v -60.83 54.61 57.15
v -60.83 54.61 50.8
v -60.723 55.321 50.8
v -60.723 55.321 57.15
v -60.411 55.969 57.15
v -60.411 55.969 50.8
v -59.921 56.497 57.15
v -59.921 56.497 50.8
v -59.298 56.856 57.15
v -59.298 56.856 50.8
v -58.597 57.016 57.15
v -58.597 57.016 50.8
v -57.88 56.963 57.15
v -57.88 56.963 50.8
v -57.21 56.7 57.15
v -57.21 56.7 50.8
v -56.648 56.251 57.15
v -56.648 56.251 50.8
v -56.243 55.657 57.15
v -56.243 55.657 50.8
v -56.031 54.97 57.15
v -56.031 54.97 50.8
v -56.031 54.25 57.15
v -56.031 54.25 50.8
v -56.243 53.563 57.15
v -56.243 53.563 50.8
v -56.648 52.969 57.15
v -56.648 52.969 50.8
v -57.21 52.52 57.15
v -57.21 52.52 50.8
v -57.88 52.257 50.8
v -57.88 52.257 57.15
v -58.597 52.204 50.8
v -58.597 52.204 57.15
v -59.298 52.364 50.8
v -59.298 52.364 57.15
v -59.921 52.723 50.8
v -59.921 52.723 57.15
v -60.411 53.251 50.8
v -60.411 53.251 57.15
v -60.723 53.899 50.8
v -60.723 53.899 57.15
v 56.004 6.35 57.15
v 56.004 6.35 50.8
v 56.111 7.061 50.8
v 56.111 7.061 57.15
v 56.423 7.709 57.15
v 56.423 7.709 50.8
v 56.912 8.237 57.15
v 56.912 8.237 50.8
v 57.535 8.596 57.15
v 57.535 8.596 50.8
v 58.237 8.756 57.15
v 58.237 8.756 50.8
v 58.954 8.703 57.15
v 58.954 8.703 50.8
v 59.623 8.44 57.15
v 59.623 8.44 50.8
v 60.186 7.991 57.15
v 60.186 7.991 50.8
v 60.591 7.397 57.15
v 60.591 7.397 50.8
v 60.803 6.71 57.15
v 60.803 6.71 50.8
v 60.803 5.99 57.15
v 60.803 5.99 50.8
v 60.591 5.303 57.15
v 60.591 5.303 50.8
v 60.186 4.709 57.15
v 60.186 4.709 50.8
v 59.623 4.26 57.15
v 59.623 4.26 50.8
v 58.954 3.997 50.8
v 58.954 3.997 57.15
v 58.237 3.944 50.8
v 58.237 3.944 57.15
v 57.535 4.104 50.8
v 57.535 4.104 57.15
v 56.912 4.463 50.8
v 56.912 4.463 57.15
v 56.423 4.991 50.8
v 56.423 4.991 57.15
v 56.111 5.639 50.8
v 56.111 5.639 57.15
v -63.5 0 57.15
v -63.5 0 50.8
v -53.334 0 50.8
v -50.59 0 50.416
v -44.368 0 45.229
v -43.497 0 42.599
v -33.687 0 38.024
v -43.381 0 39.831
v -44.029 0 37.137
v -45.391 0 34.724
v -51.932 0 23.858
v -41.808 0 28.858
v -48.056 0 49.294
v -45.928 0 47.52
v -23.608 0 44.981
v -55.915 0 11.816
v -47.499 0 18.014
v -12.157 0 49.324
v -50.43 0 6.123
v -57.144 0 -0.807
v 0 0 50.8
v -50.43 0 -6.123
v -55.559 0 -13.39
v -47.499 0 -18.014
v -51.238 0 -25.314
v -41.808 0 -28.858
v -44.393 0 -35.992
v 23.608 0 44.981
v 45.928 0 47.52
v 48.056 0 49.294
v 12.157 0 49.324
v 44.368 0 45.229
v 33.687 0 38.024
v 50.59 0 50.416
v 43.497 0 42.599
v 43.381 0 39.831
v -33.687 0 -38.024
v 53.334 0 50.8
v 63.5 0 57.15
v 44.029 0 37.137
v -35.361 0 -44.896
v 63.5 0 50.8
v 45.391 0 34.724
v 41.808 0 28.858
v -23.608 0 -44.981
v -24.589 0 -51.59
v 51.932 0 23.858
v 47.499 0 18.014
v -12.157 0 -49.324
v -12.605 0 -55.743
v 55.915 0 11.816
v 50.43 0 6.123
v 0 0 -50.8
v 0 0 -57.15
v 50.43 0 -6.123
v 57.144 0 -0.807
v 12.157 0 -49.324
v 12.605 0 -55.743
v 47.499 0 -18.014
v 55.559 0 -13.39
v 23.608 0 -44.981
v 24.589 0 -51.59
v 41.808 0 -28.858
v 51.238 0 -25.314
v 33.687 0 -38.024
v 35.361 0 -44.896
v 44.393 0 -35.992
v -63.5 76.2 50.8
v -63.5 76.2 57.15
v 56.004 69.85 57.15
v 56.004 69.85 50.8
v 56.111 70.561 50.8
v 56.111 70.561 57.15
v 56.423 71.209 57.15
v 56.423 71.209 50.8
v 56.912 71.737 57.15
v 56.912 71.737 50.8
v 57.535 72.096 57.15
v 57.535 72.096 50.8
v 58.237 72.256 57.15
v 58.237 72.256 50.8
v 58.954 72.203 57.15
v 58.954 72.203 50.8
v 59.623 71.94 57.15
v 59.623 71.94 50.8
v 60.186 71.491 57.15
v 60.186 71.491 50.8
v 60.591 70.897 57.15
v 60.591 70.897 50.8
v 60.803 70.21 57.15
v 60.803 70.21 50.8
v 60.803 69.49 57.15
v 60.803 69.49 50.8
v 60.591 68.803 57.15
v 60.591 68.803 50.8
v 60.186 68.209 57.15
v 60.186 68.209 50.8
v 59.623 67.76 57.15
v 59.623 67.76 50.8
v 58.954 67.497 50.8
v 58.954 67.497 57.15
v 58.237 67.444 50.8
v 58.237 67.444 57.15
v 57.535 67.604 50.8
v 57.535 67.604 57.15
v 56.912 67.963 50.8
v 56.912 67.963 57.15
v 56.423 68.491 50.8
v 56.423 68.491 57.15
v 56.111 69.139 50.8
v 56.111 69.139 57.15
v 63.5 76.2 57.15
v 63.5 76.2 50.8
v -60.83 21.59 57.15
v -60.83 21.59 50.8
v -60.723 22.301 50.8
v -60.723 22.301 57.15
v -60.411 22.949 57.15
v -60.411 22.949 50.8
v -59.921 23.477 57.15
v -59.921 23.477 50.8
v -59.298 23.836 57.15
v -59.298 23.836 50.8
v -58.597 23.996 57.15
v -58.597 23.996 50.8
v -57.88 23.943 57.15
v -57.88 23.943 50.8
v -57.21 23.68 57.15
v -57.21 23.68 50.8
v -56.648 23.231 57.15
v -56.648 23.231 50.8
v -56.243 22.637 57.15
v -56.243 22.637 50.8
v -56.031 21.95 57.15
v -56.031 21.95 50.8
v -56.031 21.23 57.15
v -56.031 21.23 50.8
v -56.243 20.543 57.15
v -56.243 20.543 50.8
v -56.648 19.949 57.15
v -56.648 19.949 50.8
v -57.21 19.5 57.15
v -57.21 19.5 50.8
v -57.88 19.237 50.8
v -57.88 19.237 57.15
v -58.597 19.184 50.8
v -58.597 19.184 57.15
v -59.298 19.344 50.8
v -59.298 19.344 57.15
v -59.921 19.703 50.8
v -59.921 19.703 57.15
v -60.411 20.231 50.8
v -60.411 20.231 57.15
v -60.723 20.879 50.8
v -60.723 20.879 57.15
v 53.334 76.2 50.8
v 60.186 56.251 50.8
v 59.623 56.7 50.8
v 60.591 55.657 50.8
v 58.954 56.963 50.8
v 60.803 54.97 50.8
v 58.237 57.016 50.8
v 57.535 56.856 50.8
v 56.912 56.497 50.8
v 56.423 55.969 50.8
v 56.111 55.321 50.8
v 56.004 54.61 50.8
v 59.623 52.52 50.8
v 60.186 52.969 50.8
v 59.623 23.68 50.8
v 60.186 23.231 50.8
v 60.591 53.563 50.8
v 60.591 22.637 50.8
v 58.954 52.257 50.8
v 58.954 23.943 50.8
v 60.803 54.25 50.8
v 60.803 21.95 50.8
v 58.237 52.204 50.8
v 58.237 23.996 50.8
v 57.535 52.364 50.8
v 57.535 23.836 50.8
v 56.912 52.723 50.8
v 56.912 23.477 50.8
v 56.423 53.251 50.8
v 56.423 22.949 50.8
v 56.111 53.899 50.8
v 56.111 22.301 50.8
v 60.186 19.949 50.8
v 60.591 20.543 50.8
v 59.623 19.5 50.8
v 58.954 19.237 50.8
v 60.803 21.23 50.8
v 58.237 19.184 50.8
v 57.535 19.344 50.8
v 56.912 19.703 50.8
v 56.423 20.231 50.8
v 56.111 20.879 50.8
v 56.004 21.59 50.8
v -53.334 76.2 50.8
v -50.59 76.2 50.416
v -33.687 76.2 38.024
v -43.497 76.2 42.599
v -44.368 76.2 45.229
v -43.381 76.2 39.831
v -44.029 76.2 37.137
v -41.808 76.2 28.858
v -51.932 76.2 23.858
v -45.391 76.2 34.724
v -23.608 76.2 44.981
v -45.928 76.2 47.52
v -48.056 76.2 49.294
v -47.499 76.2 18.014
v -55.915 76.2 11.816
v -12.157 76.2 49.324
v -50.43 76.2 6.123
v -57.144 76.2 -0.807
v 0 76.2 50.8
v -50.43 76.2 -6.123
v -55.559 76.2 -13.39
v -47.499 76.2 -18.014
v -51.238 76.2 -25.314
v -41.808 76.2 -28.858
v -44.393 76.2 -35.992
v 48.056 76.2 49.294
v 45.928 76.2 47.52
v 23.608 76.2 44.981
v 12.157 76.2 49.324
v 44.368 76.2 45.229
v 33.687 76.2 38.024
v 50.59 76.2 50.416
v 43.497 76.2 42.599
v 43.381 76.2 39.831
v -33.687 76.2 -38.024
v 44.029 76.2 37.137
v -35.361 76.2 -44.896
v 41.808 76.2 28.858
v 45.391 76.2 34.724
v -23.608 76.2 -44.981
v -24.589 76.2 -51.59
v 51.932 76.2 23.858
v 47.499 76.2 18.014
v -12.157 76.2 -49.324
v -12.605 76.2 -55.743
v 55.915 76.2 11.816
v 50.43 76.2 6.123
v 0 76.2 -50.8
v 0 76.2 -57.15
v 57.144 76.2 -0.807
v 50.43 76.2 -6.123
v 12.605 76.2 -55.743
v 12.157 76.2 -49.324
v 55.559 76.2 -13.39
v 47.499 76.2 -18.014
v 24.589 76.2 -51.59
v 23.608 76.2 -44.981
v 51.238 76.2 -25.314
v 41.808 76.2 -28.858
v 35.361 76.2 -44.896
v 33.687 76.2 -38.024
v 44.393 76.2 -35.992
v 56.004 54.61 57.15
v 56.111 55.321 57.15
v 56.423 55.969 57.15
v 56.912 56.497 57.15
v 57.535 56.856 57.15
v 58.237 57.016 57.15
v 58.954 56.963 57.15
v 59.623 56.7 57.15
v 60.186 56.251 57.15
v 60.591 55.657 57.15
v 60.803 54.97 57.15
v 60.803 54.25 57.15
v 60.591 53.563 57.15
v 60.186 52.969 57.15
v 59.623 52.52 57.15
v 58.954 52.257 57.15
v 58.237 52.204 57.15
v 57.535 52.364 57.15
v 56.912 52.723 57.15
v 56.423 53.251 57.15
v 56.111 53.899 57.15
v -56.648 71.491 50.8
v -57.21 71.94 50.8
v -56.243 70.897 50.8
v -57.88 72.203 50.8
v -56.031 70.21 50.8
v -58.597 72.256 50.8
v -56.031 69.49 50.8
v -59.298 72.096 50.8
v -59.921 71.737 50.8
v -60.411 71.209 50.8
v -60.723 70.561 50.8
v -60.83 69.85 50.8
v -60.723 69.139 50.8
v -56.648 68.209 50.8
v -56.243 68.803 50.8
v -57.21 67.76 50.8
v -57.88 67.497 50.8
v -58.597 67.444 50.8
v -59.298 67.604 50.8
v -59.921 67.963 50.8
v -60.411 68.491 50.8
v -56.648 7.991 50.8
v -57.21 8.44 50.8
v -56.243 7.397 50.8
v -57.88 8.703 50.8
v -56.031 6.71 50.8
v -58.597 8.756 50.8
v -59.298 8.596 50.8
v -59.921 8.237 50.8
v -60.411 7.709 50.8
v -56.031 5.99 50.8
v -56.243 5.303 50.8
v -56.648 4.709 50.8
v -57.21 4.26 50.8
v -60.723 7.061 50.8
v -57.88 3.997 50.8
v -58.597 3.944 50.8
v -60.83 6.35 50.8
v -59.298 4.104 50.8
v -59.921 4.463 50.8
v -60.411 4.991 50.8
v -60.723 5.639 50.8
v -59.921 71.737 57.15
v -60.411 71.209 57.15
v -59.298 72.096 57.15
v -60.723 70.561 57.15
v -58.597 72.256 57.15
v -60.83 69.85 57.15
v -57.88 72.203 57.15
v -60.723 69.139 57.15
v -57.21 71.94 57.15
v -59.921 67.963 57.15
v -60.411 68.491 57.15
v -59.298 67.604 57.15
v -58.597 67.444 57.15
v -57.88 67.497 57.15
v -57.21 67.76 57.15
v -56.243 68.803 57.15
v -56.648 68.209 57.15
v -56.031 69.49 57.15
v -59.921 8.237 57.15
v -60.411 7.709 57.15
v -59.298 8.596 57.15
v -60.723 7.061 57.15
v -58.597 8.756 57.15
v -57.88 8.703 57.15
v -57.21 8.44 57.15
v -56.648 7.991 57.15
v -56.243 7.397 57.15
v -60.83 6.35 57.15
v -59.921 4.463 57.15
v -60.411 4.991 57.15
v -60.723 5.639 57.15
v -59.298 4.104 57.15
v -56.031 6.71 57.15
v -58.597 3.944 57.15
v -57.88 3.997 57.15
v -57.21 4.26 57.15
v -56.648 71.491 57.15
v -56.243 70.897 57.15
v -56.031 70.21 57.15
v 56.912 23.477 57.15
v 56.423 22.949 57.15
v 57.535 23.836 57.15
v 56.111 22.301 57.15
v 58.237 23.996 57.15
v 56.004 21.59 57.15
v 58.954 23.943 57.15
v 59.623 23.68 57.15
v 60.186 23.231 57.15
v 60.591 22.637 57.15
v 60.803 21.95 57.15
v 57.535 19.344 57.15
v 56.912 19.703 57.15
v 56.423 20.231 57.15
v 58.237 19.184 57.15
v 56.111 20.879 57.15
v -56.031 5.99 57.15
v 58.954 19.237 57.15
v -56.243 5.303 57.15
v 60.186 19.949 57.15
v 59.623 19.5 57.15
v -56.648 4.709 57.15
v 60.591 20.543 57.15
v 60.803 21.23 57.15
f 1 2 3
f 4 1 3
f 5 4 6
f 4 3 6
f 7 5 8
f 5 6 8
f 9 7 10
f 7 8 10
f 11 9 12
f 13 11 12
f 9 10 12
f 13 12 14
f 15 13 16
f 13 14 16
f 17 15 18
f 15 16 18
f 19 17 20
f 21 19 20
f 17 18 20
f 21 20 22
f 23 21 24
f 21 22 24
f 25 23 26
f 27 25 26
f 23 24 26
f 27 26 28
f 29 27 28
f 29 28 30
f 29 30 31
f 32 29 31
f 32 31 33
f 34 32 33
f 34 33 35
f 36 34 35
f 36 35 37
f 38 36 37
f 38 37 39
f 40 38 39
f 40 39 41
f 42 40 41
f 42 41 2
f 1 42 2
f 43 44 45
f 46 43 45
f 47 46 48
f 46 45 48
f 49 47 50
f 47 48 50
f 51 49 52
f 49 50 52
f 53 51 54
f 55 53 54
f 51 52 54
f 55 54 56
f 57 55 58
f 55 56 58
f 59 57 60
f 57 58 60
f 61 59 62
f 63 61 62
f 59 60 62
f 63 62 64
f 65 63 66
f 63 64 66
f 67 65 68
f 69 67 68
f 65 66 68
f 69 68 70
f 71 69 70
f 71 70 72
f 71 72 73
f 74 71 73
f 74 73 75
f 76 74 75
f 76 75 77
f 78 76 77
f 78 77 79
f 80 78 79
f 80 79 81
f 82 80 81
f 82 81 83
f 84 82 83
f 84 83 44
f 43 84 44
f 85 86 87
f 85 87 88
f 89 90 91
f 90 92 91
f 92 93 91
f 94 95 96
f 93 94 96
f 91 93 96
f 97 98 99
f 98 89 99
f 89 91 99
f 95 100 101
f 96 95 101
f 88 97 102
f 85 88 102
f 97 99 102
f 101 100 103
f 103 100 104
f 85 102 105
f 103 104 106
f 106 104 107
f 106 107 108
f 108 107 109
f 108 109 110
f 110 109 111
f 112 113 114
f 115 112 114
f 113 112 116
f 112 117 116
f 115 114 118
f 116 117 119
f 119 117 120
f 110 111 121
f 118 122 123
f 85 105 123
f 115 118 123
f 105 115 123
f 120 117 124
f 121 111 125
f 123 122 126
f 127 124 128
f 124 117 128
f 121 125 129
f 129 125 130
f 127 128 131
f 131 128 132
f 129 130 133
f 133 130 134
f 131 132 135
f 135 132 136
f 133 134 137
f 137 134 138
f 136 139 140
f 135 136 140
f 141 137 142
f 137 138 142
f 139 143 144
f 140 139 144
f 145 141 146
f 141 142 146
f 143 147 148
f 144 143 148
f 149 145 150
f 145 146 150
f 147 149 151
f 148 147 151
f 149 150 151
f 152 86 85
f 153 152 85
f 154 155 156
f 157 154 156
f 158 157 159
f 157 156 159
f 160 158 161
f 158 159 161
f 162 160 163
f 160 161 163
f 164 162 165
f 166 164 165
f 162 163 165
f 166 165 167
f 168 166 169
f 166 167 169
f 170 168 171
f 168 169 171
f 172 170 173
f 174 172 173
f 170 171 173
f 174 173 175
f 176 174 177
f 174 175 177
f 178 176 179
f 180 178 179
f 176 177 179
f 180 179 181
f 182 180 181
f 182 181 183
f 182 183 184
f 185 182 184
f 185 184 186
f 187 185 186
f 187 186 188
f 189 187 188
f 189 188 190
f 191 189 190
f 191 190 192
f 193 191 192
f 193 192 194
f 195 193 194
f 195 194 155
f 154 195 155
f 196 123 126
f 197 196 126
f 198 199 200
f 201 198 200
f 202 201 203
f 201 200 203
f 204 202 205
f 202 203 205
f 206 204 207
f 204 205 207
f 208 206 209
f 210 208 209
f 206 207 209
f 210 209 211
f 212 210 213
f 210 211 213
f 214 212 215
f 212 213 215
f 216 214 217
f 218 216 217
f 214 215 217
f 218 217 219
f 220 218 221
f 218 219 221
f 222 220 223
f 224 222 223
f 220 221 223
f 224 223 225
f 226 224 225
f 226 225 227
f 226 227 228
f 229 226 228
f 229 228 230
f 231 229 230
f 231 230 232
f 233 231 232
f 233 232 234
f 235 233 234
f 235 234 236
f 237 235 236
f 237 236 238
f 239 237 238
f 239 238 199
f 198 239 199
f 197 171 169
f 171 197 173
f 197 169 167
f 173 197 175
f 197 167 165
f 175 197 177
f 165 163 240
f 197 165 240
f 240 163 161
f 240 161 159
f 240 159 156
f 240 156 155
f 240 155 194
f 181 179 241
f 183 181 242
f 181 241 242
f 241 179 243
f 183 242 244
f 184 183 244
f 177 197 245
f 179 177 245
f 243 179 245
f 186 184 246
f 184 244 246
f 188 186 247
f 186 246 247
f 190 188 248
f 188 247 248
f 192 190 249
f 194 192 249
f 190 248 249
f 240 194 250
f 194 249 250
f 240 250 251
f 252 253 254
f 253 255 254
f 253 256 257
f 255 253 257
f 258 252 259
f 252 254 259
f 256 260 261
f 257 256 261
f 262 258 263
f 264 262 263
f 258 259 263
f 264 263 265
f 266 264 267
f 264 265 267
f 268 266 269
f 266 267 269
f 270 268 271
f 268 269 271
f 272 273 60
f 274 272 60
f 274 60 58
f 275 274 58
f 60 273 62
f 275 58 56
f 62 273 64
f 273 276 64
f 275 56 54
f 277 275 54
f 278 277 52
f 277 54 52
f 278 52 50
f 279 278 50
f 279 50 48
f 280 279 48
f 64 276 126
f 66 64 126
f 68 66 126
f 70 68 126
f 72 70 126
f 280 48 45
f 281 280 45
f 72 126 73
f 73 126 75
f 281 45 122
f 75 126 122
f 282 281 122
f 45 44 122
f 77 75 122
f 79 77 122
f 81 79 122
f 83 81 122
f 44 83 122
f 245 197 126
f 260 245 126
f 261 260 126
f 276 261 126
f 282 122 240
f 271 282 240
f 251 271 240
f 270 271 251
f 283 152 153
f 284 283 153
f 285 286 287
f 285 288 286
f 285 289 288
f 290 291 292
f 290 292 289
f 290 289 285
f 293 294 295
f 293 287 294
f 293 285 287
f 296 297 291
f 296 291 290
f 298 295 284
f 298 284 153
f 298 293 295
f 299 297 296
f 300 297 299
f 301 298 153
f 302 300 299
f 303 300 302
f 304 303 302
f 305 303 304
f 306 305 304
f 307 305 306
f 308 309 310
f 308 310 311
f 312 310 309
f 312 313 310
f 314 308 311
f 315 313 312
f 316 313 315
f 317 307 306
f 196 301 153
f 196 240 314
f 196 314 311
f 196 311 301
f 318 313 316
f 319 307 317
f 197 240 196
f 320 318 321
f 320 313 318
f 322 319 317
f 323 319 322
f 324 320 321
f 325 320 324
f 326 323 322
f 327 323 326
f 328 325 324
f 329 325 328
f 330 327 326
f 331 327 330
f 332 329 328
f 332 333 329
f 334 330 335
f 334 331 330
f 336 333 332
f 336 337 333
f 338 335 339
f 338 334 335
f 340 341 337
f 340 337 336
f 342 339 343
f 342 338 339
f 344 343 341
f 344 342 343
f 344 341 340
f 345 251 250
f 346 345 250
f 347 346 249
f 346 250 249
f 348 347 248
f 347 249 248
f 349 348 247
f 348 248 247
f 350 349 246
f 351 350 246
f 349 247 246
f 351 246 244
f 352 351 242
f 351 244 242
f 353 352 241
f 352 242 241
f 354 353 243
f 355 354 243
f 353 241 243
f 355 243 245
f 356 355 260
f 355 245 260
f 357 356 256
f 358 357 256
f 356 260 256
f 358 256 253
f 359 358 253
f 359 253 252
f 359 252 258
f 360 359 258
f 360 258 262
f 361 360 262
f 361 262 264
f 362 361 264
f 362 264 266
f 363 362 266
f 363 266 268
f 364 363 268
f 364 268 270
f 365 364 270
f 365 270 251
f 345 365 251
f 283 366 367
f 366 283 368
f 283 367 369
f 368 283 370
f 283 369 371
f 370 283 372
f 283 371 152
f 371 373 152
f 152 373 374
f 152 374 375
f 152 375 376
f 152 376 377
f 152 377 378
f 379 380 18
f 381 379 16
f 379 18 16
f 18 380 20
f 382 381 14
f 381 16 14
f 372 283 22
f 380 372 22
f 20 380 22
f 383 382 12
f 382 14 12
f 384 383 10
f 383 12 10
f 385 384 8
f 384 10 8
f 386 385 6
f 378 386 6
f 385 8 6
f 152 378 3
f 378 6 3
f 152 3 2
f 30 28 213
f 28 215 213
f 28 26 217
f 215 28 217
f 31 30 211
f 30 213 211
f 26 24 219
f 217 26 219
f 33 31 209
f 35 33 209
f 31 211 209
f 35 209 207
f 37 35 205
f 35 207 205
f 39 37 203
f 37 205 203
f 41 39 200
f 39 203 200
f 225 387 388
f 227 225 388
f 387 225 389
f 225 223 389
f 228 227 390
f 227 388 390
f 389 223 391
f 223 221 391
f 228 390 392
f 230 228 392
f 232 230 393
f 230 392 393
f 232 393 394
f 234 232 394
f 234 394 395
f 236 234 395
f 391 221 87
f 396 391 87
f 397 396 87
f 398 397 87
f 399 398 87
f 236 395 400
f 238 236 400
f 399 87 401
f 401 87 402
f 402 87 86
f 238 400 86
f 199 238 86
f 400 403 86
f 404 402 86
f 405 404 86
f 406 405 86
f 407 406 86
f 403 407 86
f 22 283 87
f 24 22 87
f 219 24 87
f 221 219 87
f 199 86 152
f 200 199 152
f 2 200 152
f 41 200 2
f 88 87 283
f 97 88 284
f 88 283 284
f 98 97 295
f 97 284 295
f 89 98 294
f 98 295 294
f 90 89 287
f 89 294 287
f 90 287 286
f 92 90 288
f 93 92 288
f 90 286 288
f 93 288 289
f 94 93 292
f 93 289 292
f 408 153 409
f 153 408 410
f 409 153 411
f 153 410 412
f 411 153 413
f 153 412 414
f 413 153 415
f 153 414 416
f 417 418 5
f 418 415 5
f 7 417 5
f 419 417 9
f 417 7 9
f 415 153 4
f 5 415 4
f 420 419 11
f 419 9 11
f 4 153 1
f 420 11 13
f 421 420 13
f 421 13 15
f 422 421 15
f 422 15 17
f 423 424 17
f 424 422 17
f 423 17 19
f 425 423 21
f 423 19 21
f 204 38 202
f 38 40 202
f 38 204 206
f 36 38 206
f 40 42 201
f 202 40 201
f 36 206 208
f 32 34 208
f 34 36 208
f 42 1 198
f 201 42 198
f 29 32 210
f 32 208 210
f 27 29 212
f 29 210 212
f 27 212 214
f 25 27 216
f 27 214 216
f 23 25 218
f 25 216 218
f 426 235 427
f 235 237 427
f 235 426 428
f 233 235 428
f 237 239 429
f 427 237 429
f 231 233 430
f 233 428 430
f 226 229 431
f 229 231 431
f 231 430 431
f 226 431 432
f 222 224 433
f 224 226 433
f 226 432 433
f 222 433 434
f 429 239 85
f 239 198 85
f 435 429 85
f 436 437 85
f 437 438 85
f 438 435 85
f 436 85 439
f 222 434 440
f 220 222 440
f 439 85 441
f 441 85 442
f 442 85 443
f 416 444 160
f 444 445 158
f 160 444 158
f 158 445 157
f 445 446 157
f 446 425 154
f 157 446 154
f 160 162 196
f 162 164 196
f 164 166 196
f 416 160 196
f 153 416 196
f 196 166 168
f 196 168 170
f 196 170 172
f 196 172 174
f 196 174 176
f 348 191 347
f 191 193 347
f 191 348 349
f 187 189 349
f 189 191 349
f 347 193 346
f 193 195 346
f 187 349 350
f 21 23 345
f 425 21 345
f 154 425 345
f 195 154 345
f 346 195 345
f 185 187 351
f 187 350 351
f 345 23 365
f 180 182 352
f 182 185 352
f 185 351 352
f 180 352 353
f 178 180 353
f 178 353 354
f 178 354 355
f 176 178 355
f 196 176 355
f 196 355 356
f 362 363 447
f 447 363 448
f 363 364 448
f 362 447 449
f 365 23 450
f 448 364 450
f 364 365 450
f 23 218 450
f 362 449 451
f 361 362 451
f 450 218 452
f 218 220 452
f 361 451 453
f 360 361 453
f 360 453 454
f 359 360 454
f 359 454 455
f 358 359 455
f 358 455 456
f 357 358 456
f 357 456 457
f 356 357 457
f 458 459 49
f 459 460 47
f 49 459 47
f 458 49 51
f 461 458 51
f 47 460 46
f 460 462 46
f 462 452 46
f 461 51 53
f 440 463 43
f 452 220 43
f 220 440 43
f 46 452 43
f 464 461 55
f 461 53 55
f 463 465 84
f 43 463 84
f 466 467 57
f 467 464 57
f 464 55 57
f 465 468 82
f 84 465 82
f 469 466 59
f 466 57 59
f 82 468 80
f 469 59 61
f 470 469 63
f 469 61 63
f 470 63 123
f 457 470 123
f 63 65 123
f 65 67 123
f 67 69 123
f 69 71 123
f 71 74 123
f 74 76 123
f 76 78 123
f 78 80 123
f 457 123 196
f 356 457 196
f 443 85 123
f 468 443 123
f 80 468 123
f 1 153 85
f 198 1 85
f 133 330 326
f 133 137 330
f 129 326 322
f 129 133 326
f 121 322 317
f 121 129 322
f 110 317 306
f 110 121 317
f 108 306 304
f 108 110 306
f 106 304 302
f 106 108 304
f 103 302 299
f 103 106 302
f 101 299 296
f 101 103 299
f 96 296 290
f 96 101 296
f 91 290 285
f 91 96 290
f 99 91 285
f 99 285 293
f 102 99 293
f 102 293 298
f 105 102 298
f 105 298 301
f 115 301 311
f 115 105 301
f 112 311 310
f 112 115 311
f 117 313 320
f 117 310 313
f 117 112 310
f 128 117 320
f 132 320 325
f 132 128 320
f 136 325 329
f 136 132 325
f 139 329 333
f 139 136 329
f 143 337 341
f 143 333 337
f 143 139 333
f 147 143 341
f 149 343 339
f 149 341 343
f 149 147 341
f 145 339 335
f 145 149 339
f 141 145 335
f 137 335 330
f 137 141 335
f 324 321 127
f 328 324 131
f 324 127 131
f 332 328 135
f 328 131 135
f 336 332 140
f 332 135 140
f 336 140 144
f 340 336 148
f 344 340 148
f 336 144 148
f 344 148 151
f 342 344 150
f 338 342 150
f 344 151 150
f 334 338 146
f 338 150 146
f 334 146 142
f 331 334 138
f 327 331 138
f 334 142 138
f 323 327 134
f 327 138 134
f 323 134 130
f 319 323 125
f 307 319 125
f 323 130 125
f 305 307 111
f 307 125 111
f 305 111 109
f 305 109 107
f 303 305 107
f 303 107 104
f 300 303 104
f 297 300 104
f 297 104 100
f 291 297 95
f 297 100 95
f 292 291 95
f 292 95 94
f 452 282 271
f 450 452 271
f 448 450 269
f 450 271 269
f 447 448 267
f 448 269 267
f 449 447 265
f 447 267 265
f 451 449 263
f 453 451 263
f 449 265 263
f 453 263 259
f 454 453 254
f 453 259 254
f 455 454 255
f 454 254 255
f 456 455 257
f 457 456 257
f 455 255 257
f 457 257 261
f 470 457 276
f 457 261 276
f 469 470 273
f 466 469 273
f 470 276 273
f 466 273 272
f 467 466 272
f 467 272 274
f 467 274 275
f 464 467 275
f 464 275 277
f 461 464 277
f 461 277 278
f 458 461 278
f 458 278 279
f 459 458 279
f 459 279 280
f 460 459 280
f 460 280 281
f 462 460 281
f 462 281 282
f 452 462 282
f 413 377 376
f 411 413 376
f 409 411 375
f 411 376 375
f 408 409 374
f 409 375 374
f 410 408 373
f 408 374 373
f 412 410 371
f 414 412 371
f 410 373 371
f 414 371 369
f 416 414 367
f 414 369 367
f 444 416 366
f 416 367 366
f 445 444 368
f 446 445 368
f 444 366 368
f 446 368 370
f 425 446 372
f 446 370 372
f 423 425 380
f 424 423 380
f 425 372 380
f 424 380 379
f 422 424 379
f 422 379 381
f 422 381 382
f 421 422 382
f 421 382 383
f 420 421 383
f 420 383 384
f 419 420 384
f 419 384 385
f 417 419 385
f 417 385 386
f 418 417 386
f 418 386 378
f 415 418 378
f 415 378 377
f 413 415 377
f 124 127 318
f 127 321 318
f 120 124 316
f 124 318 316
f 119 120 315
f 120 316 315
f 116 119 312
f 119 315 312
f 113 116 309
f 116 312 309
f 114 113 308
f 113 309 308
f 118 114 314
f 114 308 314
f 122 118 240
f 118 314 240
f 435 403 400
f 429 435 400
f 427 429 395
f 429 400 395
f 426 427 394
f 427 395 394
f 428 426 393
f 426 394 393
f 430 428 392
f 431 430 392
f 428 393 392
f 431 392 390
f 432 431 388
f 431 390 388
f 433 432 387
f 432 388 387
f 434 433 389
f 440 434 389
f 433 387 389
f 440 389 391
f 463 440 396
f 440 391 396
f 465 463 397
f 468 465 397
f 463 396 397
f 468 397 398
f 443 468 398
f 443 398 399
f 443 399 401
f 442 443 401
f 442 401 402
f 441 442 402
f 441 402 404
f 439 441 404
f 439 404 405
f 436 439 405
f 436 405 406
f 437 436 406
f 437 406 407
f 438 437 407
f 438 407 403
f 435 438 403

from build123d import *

# Parameters (mm, degrees)
SKETCH1_R           = 57.15
SKETCH1_R_2         = 50.8
BOSS_EXTRUDE1_DEPTH = 76.2
FILLET3_R           = 10
SKETCH2_R           = 2.413
CUT_EXTRUDE1_DEPTH  = 147.601134034


with BuildPart() as part:
    # Sketch1 → Boss-Extrude1 (new body)
    # profile 1 of 4: a face of its own
    with BuildSketch(Plane(origin=(0, 0, 0), x_dir=(1, 0, 0), z_dir=(0, 1, 0))):
        Circle(SKETCH1_R)
        with Locations(Location((0, 0, 0), (0, 0, 90))):
            Circle(SKETCH1_R_2, mode=Mode.SUBTRACT)
    # profile 2 of 4: a face of its own
    with BuildSketch(Plane(origin=(0, 0, 0), x_dir=(1, 0, 0), z_dir=(0, 1, 0))):
        with BuildLine():
            Line((-63.5, -57.15), (1.05e-07, -57.15))
            ThreePointArc((1.05e-07, -57.15), (-13.470384131, -55.539816811), (-26.181720723, -50.8))
            Line((-26.181720723, -50.8), (-63.5, -50.8))
            Line((-63.5, -50.8), (-63.5, -57.15))
        make_face()
    # profile 3 of 4: a face of its own
    with BuildSketch(Plane(origin=(0, 0, 0), x_dir=(1, 0, 0), z_dir=(0, 1, 0))):
        with BuildLine():
            ThreePointArc((-26.181720723, -50.8), (-13.470384131, -55.539816811), (1.05e-07, -57.15))
            ThreePointArc((1.05e-07, -57.15), (13.470384232, -55.539816786), (26.181720723, -50.8))
            Line((26.181720723, -50.8), (9.7e-08, -50.8))
            Line((9.7e-08, -50.8), (-26.181720723, -50.8))
        make_face()
    # profile 4 of 4: a face of its own
    with BuildSketch(Plane(origin=(0, 0, 0), x_dir=(1, 0, 0), z_dir=(0, 1, 0))):
        with BuildLine():
            Line((1.05e-07, -57.15), (63.5, -57.15))
            Line((63.5, -57.15), (63.5, -50.8))
            Line((63.5, -50.8), (26.181720723, -50.8))
            ThreePointArc((26.181720723, -50.8), (13.470384232, -55.539816786), (1.05e-07, -57.15))
        make_face()
    extrude(amount=BOSS_EXTRUDE1_DEPTH)

    # Fillet3
    fillet3_edges = [part.edges().sort_by_distance(p)[0] for p in [
        (26.181720723, 38.1, 50.8),
        (-26.181720723, 38.1, 50.8),
    ]]
    fillet(fillet3_edges, radius=FILLET3_R)

    # Sketch2 → Cut-Extrude1 (cut, through all)
    with BuildSketch(Plane(origin=(0, 0, 50.8), x_dir=(-1, 0, 0), z_dir=(0, 0, -1))):
        with Locations((58.416845051, 6.35)):
            Circle(SKETCH2_R)
        with Locations((58.416845051, 21.59)):
            Circle(SKETCH2_R)
        with Locations((58.416845051, 69.85)):
            Circle(SKETCH2_R)
        with Locations((58.416845051, 54.61)):
            Circle(SKETCH2_R)
        with Locations((-58.416845051, 6.35)):
            Circle(SKETCH2_R)
        with Locations((-58.416845051, 21.59)):
            Circle(SKETCH2_R)
        with Locations((-58.416845051, 69.85)):
            Circle(SKETCH2_R)
        with Locations((-58.416845051, 54.61)):
            Circle(SKETCH2_R)
    extrude(amount=-CUT_EXTRUDE1_DEPTH, mode=Mode.SUBTRACT)


solid = part.part
